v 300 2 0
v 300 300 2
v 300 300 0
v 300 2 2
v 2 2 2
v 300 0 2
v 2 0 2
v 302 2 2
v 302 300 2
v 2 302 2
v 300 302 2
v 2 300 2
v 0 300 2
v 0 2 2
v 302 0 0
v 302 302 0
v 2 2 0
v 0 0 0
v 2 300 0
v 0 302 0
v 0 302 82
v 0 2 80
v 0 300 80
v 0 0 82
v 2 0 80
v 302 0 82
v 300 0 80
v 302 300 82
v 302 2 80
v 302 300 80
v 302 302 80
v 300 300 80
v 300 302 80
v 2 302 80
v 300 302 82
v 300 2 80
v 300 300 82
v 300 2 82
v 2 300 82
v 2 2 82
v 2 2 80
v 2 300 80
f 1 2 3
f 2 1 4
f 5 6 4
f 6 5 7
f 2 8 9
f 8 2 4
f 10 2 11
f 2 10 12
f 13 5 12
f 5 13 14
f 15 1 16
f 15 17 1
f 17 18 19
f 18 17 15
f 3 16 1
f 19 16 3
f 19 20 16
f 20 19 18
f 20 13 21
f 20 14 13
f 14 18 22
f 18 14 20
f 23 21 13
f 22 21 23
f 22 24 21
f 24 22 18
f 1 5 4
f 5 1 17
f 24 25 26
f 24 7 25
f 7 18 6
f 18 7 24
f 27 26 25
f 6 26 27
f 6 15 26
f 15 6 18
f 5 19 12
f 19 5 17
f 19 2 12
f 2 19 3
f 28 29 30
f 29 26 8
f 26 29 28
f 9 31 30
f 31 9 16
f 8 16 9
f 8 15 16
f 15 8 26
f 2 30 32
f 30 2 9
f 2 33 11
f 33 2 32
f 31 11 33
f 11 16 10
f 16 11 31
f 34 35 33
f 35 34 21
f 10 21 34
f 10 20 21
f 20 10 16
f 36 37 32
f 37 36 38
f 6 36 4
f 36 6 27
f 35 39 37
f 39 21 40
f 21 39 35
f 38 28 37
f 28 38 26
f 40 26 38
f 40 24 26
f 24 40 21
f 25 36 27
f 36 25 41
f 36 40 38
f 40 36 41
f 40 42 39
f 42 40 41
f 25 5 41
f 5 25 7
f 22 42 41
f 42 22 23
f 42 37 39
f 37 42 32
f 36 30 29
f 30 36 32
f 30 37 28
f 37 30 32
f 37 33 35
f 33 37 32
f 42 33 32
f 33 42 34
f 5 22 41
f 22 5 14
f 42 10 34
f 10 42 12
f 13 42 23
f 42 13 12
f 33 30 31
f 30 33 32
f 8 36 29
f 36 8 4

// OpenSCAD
h = 80;
d = 2;

cube([300,d,d]);
cube([d,300,d]);
translate([300,0,0])cube([d,300,d]);
translate([0,300,0])cube([300,d,d]);

translate([0,0,h])cube([300,d,d]);
translate([0,0,h])cube([d,300,d]);
translate([0,0,h])translate([300,0,0])cube([d,300,d]);
translate([0,0,h])translate([0,300,0])cube([300,d,d]);

cube([d,d,h]);
translate([0,300,0])cube([d,d,h]);
translate([300,300,0])cube([d,d,h]);
translate([300,0,0])cube([d,d,h]);

/*translate([d,d,30])cube([45,120,d]);
translate([43,120-d,0])cube([d,d,30]);
translate([43,d*2,0])cube([d,d,30]);

translate([0,250,30])cube([120,50,d]);
translate([115,250+d,0])cube([d,d,30]);
translate([d*2,250+d,0])cube([d,d,30]);
*/
